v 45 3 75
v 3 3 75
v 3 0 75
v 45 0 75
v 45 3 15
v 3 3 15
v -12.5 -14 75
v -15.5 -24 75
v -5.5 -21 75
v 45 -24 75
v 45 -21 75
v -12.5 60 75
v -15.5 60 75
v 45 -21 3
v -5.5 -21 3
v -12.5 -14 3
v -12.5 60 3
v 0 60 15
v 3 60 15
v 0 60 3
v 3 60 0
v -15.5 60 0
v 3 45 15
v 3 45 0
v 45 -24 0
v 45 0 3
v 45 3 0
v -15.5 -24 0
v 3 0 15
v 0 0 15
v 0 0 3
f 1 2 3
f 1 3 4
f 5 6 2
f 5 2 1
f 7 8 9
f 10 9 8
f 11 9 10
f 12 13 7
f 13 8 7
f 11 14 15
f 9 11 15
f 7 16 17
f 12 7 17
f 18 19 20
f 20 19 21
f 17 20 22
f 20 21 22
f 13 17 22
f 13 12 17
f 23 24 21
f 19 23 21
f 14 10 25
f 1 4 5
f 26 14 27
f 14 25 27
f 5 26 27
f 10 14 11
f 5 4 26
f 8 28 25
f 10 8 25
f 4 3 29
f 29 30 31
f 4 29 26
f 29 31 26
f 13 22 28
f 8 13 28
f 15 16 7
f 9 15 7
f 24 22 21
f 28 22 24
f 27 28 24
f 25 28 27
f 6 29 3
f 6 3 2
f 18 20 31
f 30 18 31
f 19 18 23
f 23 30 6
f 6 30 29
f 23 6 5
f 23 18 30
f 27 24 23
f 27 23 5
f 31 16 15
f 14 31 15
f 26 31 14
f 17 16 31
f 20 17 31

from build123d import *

# Parameters (mm, degrees)
F1_DEPTH = 3
F2_DEPTH = 75
F3_DEPTH = 15
F4_SIZE  = 7
F5_W     = 42
F5_H     = 3
F6_DEPTH = 60
F8_DEPTH = 15


with BuildPart() as f1:
    # F0 (on Top) → F1 (new body)
    with BuildSketch(Plane.XY):
        Polygon((0, 60), (-12.5, 60), (-12.5, -21), (45, -21), (45, 0), (0, 0), align=None)
    extrude(amount=F1_DEPTH)

    # F0 (on Top) → F2 (join)
    with BuildSketch(Plane.XY):
        Polygon((-12.5, -21), (-12.5, 60), (-15.5, 60), (-15.5, -24), (45, -24), (45, -21), align=None)
    extrude(amount=F2_DEPTH)

    # F0 (on Top) → F3 (join)
    with BuildSketch(Plane.XY):
        Polygon((3, 60), (0, 60), (0, 0), (45, 0), (45, 3), (3, 3), align=None)
    extrude(amount=F3_DEPTH)

    # F4
    f4_edges = [f1.edges().sort_by_distance(p)[0] for p in [
        (-12.5, -21, 39),
    ]]
    chamfer(f4_edges, length=F4_SIZE)

    # F5 (on face) → F6 (join, through all)
    with BuildSketch(Plane.XY.offset(15)):
        with Locations((24, 1.5)):
            Rectangle(F5_W, F5_H)
    extrude(amount=F6_DEPTH)

    # F7 (on face) → F8 (join, through all)
    with BuildSketch(Plane(origin=(0, 0, 0), x_dir=(1, 0, 0), z_dir=(0, 0, -1))):
        Polygon((3, -45), (45, -3), (3, -3), align=None)
    extrude(amount=-F8_DEPTH)


solid = f1.part
